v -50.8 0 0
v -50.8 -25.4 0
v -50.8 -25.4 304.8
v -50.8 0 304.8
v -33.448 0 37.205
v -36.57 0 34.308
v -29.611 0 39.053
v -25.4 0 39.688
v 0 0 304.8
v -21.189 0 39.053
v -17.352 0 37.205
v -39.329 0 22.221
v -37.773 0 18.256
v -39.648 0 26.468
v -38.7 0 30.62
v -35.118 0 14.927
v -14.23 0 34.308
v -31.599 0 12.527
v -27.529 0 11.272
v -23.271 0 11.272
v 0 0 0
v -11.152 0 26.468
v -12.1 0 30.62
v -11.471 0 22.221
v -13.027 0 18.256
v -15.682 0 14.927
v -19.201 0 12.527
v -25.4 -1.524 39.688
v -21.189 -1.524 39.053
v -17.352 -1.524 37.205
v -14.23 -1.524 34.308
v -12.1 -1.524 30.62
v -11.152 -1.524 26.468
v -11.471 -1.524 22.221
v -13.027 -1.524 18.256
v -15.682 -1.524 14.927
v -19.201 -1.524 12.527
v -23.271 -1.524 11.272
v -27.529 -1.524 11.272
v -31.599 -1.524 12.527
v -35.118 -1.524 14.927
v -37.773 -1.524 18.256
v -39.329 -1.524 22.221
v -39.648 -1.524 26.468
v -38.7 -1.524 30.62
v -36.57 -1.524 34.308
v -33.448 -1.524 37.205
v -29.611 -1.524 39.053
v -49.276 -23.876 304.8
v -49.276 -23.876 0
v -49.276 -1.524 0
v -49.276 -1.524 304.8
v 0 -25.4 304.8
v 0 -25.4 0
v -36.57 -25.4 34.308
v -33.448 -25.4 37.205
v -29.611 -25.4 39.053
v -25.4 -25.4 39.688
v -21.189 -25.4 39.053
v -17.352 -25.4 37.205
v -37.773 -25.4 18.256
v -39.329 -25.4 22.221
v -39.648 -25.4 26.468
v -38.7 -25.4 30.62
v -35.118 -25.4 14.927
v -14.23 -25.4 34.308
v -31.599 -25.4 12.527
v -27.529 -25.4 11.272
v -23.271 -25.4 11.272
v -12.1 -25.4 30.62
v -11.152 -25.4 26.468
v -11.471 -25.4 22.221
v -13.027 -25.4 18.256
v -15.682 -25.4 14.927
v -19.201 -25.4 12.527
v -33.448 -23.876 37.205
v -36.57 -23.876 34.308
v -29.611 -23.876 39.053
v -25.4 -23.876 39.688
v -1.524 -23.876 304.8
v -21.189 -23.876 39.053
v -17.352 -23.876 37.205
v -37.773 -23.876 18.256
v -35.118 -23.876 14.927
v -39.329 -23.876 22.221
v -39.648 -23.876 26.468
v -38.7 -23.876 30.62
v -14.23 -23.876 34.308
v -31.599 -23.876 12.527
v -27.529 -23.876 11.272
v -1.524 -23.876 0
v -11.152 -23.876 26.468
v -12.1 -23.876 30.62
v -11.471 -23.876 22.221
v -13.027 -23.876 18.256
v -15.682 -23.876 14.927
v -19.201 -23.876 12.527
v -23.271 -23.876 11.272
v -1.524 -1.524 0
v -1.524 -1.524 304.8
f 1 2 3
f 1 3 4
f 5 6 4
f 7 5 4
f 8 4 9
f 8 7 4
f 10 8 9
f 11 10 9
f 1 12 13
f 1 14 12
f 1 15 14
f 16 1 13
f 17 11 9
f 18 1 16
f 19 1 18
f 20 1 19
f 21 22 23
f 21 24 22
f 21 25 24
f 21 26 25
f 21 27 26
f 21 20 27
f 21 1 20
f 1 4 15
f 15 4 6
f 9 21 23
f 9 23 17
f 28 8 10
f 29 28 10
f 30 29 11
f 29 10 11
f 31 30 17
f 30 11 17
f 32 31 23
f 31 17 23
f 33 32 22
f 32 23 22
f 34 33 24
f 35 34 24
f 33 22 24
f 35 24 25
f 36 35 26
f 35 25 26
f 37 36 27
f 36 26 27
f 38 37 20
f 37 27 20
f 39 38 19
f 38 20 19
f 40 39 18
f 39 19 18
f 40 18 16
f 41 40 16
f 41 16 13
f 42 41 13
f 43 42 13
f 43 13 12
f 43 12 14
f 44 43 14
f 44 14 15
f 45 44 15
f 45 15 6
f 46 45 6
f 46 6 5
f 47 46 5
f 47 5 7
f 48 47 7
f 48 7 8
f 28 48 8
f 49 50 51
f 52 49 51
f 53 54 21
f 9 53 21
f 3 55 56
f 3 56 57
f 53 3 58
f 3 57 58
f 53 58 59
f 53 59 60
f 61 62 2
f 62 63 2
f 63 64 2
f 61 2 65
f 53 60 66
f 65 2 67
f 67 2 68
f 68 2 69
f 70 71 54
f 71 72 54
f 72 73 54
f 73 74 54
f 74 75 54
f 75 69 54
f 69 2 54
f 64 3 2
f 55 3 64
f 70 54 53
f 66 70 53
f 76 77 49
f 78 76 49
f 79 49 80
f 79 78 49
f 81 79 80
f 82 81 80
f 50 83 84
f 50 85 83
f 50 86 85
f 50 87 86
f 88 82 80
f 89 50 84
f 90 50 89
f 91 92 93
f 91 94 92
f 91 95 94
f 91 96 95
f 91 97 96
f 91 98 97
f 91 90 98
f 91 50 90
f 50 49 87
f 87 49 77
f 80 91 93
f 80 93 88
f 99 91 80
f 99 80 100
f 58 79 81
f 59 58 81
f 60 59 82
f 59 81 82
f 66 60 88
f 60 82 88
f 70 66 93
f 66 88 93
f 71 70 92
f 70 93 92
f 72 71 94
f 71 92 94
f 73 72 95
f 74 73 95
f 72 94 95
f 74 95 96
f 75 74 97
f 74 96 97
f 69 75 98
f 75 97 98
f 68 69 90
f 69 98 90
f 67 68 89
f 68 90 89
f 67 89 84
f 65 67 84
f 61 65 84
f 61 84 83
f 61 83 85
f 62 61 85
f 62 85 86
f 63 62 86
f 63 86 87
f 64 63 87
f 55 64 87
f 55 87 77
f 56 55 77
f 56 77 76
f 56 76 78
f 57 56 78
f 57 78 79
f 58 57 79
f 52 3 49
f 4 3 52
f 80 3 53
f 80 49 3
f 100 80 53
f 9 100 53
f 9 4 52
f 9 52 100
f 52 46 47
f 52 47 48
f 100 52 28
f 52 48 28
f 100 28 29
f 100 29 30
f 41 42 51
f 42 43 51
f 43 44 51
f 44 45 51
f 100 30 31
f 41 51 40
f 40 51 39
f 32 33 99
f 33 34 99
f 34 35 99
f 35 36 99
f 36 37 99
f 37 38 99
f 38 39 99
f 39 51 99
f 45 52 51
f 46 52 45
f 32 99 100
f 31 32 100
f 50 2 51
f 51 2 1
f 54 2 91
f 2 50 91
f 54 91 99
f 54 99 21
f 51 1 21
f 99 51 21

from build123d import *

# Parameters (mm, degrees)
SKETCH1_W           = 50.8
SKETCH1_H           = 25.4
SKETCH1_W_2         = 47.752
SKETCH1_H_2         = 22.352
EXTRUDE_THIN1_DEPTH = 304.8
SKETCH2_R           = 14.2875
CUT_EXTRUDE2_DEPTH  = 25.4


with BuildPart() as part:
    # Sketch1 → Extrude-Thin1 (new body)
    with BuildSketch(Plane.XY):
        with Locations((-25.4, -12.7)):
            Rectangle(SKETCH1_W, SKETCH1_H)
        with Locations((-25.4, -12.7)):
            Rectangle(SKETCH1_W_2, SKETCH1_H_2, mode=Mode.SUBTRACT)
    extrude(amount=EXTRUDE_THIN1_DEPTH)

    # Sketch2 → Cut-Extrude2 (cut)
    with BuildSketch(Plane(origin=(0, 0, 0), x_dir=(1, 0, 0), z_dir=(0, 1, 0))):
        with Locations(Location((-25.4, -25.4, 0), (0, 0, 270))):
            Circle(SKETCH2_R)
    extrude(amount=-CUT_EXTRUDE2_DEPTH, mode=Mode.SUBTRACT)


solid = part.part
